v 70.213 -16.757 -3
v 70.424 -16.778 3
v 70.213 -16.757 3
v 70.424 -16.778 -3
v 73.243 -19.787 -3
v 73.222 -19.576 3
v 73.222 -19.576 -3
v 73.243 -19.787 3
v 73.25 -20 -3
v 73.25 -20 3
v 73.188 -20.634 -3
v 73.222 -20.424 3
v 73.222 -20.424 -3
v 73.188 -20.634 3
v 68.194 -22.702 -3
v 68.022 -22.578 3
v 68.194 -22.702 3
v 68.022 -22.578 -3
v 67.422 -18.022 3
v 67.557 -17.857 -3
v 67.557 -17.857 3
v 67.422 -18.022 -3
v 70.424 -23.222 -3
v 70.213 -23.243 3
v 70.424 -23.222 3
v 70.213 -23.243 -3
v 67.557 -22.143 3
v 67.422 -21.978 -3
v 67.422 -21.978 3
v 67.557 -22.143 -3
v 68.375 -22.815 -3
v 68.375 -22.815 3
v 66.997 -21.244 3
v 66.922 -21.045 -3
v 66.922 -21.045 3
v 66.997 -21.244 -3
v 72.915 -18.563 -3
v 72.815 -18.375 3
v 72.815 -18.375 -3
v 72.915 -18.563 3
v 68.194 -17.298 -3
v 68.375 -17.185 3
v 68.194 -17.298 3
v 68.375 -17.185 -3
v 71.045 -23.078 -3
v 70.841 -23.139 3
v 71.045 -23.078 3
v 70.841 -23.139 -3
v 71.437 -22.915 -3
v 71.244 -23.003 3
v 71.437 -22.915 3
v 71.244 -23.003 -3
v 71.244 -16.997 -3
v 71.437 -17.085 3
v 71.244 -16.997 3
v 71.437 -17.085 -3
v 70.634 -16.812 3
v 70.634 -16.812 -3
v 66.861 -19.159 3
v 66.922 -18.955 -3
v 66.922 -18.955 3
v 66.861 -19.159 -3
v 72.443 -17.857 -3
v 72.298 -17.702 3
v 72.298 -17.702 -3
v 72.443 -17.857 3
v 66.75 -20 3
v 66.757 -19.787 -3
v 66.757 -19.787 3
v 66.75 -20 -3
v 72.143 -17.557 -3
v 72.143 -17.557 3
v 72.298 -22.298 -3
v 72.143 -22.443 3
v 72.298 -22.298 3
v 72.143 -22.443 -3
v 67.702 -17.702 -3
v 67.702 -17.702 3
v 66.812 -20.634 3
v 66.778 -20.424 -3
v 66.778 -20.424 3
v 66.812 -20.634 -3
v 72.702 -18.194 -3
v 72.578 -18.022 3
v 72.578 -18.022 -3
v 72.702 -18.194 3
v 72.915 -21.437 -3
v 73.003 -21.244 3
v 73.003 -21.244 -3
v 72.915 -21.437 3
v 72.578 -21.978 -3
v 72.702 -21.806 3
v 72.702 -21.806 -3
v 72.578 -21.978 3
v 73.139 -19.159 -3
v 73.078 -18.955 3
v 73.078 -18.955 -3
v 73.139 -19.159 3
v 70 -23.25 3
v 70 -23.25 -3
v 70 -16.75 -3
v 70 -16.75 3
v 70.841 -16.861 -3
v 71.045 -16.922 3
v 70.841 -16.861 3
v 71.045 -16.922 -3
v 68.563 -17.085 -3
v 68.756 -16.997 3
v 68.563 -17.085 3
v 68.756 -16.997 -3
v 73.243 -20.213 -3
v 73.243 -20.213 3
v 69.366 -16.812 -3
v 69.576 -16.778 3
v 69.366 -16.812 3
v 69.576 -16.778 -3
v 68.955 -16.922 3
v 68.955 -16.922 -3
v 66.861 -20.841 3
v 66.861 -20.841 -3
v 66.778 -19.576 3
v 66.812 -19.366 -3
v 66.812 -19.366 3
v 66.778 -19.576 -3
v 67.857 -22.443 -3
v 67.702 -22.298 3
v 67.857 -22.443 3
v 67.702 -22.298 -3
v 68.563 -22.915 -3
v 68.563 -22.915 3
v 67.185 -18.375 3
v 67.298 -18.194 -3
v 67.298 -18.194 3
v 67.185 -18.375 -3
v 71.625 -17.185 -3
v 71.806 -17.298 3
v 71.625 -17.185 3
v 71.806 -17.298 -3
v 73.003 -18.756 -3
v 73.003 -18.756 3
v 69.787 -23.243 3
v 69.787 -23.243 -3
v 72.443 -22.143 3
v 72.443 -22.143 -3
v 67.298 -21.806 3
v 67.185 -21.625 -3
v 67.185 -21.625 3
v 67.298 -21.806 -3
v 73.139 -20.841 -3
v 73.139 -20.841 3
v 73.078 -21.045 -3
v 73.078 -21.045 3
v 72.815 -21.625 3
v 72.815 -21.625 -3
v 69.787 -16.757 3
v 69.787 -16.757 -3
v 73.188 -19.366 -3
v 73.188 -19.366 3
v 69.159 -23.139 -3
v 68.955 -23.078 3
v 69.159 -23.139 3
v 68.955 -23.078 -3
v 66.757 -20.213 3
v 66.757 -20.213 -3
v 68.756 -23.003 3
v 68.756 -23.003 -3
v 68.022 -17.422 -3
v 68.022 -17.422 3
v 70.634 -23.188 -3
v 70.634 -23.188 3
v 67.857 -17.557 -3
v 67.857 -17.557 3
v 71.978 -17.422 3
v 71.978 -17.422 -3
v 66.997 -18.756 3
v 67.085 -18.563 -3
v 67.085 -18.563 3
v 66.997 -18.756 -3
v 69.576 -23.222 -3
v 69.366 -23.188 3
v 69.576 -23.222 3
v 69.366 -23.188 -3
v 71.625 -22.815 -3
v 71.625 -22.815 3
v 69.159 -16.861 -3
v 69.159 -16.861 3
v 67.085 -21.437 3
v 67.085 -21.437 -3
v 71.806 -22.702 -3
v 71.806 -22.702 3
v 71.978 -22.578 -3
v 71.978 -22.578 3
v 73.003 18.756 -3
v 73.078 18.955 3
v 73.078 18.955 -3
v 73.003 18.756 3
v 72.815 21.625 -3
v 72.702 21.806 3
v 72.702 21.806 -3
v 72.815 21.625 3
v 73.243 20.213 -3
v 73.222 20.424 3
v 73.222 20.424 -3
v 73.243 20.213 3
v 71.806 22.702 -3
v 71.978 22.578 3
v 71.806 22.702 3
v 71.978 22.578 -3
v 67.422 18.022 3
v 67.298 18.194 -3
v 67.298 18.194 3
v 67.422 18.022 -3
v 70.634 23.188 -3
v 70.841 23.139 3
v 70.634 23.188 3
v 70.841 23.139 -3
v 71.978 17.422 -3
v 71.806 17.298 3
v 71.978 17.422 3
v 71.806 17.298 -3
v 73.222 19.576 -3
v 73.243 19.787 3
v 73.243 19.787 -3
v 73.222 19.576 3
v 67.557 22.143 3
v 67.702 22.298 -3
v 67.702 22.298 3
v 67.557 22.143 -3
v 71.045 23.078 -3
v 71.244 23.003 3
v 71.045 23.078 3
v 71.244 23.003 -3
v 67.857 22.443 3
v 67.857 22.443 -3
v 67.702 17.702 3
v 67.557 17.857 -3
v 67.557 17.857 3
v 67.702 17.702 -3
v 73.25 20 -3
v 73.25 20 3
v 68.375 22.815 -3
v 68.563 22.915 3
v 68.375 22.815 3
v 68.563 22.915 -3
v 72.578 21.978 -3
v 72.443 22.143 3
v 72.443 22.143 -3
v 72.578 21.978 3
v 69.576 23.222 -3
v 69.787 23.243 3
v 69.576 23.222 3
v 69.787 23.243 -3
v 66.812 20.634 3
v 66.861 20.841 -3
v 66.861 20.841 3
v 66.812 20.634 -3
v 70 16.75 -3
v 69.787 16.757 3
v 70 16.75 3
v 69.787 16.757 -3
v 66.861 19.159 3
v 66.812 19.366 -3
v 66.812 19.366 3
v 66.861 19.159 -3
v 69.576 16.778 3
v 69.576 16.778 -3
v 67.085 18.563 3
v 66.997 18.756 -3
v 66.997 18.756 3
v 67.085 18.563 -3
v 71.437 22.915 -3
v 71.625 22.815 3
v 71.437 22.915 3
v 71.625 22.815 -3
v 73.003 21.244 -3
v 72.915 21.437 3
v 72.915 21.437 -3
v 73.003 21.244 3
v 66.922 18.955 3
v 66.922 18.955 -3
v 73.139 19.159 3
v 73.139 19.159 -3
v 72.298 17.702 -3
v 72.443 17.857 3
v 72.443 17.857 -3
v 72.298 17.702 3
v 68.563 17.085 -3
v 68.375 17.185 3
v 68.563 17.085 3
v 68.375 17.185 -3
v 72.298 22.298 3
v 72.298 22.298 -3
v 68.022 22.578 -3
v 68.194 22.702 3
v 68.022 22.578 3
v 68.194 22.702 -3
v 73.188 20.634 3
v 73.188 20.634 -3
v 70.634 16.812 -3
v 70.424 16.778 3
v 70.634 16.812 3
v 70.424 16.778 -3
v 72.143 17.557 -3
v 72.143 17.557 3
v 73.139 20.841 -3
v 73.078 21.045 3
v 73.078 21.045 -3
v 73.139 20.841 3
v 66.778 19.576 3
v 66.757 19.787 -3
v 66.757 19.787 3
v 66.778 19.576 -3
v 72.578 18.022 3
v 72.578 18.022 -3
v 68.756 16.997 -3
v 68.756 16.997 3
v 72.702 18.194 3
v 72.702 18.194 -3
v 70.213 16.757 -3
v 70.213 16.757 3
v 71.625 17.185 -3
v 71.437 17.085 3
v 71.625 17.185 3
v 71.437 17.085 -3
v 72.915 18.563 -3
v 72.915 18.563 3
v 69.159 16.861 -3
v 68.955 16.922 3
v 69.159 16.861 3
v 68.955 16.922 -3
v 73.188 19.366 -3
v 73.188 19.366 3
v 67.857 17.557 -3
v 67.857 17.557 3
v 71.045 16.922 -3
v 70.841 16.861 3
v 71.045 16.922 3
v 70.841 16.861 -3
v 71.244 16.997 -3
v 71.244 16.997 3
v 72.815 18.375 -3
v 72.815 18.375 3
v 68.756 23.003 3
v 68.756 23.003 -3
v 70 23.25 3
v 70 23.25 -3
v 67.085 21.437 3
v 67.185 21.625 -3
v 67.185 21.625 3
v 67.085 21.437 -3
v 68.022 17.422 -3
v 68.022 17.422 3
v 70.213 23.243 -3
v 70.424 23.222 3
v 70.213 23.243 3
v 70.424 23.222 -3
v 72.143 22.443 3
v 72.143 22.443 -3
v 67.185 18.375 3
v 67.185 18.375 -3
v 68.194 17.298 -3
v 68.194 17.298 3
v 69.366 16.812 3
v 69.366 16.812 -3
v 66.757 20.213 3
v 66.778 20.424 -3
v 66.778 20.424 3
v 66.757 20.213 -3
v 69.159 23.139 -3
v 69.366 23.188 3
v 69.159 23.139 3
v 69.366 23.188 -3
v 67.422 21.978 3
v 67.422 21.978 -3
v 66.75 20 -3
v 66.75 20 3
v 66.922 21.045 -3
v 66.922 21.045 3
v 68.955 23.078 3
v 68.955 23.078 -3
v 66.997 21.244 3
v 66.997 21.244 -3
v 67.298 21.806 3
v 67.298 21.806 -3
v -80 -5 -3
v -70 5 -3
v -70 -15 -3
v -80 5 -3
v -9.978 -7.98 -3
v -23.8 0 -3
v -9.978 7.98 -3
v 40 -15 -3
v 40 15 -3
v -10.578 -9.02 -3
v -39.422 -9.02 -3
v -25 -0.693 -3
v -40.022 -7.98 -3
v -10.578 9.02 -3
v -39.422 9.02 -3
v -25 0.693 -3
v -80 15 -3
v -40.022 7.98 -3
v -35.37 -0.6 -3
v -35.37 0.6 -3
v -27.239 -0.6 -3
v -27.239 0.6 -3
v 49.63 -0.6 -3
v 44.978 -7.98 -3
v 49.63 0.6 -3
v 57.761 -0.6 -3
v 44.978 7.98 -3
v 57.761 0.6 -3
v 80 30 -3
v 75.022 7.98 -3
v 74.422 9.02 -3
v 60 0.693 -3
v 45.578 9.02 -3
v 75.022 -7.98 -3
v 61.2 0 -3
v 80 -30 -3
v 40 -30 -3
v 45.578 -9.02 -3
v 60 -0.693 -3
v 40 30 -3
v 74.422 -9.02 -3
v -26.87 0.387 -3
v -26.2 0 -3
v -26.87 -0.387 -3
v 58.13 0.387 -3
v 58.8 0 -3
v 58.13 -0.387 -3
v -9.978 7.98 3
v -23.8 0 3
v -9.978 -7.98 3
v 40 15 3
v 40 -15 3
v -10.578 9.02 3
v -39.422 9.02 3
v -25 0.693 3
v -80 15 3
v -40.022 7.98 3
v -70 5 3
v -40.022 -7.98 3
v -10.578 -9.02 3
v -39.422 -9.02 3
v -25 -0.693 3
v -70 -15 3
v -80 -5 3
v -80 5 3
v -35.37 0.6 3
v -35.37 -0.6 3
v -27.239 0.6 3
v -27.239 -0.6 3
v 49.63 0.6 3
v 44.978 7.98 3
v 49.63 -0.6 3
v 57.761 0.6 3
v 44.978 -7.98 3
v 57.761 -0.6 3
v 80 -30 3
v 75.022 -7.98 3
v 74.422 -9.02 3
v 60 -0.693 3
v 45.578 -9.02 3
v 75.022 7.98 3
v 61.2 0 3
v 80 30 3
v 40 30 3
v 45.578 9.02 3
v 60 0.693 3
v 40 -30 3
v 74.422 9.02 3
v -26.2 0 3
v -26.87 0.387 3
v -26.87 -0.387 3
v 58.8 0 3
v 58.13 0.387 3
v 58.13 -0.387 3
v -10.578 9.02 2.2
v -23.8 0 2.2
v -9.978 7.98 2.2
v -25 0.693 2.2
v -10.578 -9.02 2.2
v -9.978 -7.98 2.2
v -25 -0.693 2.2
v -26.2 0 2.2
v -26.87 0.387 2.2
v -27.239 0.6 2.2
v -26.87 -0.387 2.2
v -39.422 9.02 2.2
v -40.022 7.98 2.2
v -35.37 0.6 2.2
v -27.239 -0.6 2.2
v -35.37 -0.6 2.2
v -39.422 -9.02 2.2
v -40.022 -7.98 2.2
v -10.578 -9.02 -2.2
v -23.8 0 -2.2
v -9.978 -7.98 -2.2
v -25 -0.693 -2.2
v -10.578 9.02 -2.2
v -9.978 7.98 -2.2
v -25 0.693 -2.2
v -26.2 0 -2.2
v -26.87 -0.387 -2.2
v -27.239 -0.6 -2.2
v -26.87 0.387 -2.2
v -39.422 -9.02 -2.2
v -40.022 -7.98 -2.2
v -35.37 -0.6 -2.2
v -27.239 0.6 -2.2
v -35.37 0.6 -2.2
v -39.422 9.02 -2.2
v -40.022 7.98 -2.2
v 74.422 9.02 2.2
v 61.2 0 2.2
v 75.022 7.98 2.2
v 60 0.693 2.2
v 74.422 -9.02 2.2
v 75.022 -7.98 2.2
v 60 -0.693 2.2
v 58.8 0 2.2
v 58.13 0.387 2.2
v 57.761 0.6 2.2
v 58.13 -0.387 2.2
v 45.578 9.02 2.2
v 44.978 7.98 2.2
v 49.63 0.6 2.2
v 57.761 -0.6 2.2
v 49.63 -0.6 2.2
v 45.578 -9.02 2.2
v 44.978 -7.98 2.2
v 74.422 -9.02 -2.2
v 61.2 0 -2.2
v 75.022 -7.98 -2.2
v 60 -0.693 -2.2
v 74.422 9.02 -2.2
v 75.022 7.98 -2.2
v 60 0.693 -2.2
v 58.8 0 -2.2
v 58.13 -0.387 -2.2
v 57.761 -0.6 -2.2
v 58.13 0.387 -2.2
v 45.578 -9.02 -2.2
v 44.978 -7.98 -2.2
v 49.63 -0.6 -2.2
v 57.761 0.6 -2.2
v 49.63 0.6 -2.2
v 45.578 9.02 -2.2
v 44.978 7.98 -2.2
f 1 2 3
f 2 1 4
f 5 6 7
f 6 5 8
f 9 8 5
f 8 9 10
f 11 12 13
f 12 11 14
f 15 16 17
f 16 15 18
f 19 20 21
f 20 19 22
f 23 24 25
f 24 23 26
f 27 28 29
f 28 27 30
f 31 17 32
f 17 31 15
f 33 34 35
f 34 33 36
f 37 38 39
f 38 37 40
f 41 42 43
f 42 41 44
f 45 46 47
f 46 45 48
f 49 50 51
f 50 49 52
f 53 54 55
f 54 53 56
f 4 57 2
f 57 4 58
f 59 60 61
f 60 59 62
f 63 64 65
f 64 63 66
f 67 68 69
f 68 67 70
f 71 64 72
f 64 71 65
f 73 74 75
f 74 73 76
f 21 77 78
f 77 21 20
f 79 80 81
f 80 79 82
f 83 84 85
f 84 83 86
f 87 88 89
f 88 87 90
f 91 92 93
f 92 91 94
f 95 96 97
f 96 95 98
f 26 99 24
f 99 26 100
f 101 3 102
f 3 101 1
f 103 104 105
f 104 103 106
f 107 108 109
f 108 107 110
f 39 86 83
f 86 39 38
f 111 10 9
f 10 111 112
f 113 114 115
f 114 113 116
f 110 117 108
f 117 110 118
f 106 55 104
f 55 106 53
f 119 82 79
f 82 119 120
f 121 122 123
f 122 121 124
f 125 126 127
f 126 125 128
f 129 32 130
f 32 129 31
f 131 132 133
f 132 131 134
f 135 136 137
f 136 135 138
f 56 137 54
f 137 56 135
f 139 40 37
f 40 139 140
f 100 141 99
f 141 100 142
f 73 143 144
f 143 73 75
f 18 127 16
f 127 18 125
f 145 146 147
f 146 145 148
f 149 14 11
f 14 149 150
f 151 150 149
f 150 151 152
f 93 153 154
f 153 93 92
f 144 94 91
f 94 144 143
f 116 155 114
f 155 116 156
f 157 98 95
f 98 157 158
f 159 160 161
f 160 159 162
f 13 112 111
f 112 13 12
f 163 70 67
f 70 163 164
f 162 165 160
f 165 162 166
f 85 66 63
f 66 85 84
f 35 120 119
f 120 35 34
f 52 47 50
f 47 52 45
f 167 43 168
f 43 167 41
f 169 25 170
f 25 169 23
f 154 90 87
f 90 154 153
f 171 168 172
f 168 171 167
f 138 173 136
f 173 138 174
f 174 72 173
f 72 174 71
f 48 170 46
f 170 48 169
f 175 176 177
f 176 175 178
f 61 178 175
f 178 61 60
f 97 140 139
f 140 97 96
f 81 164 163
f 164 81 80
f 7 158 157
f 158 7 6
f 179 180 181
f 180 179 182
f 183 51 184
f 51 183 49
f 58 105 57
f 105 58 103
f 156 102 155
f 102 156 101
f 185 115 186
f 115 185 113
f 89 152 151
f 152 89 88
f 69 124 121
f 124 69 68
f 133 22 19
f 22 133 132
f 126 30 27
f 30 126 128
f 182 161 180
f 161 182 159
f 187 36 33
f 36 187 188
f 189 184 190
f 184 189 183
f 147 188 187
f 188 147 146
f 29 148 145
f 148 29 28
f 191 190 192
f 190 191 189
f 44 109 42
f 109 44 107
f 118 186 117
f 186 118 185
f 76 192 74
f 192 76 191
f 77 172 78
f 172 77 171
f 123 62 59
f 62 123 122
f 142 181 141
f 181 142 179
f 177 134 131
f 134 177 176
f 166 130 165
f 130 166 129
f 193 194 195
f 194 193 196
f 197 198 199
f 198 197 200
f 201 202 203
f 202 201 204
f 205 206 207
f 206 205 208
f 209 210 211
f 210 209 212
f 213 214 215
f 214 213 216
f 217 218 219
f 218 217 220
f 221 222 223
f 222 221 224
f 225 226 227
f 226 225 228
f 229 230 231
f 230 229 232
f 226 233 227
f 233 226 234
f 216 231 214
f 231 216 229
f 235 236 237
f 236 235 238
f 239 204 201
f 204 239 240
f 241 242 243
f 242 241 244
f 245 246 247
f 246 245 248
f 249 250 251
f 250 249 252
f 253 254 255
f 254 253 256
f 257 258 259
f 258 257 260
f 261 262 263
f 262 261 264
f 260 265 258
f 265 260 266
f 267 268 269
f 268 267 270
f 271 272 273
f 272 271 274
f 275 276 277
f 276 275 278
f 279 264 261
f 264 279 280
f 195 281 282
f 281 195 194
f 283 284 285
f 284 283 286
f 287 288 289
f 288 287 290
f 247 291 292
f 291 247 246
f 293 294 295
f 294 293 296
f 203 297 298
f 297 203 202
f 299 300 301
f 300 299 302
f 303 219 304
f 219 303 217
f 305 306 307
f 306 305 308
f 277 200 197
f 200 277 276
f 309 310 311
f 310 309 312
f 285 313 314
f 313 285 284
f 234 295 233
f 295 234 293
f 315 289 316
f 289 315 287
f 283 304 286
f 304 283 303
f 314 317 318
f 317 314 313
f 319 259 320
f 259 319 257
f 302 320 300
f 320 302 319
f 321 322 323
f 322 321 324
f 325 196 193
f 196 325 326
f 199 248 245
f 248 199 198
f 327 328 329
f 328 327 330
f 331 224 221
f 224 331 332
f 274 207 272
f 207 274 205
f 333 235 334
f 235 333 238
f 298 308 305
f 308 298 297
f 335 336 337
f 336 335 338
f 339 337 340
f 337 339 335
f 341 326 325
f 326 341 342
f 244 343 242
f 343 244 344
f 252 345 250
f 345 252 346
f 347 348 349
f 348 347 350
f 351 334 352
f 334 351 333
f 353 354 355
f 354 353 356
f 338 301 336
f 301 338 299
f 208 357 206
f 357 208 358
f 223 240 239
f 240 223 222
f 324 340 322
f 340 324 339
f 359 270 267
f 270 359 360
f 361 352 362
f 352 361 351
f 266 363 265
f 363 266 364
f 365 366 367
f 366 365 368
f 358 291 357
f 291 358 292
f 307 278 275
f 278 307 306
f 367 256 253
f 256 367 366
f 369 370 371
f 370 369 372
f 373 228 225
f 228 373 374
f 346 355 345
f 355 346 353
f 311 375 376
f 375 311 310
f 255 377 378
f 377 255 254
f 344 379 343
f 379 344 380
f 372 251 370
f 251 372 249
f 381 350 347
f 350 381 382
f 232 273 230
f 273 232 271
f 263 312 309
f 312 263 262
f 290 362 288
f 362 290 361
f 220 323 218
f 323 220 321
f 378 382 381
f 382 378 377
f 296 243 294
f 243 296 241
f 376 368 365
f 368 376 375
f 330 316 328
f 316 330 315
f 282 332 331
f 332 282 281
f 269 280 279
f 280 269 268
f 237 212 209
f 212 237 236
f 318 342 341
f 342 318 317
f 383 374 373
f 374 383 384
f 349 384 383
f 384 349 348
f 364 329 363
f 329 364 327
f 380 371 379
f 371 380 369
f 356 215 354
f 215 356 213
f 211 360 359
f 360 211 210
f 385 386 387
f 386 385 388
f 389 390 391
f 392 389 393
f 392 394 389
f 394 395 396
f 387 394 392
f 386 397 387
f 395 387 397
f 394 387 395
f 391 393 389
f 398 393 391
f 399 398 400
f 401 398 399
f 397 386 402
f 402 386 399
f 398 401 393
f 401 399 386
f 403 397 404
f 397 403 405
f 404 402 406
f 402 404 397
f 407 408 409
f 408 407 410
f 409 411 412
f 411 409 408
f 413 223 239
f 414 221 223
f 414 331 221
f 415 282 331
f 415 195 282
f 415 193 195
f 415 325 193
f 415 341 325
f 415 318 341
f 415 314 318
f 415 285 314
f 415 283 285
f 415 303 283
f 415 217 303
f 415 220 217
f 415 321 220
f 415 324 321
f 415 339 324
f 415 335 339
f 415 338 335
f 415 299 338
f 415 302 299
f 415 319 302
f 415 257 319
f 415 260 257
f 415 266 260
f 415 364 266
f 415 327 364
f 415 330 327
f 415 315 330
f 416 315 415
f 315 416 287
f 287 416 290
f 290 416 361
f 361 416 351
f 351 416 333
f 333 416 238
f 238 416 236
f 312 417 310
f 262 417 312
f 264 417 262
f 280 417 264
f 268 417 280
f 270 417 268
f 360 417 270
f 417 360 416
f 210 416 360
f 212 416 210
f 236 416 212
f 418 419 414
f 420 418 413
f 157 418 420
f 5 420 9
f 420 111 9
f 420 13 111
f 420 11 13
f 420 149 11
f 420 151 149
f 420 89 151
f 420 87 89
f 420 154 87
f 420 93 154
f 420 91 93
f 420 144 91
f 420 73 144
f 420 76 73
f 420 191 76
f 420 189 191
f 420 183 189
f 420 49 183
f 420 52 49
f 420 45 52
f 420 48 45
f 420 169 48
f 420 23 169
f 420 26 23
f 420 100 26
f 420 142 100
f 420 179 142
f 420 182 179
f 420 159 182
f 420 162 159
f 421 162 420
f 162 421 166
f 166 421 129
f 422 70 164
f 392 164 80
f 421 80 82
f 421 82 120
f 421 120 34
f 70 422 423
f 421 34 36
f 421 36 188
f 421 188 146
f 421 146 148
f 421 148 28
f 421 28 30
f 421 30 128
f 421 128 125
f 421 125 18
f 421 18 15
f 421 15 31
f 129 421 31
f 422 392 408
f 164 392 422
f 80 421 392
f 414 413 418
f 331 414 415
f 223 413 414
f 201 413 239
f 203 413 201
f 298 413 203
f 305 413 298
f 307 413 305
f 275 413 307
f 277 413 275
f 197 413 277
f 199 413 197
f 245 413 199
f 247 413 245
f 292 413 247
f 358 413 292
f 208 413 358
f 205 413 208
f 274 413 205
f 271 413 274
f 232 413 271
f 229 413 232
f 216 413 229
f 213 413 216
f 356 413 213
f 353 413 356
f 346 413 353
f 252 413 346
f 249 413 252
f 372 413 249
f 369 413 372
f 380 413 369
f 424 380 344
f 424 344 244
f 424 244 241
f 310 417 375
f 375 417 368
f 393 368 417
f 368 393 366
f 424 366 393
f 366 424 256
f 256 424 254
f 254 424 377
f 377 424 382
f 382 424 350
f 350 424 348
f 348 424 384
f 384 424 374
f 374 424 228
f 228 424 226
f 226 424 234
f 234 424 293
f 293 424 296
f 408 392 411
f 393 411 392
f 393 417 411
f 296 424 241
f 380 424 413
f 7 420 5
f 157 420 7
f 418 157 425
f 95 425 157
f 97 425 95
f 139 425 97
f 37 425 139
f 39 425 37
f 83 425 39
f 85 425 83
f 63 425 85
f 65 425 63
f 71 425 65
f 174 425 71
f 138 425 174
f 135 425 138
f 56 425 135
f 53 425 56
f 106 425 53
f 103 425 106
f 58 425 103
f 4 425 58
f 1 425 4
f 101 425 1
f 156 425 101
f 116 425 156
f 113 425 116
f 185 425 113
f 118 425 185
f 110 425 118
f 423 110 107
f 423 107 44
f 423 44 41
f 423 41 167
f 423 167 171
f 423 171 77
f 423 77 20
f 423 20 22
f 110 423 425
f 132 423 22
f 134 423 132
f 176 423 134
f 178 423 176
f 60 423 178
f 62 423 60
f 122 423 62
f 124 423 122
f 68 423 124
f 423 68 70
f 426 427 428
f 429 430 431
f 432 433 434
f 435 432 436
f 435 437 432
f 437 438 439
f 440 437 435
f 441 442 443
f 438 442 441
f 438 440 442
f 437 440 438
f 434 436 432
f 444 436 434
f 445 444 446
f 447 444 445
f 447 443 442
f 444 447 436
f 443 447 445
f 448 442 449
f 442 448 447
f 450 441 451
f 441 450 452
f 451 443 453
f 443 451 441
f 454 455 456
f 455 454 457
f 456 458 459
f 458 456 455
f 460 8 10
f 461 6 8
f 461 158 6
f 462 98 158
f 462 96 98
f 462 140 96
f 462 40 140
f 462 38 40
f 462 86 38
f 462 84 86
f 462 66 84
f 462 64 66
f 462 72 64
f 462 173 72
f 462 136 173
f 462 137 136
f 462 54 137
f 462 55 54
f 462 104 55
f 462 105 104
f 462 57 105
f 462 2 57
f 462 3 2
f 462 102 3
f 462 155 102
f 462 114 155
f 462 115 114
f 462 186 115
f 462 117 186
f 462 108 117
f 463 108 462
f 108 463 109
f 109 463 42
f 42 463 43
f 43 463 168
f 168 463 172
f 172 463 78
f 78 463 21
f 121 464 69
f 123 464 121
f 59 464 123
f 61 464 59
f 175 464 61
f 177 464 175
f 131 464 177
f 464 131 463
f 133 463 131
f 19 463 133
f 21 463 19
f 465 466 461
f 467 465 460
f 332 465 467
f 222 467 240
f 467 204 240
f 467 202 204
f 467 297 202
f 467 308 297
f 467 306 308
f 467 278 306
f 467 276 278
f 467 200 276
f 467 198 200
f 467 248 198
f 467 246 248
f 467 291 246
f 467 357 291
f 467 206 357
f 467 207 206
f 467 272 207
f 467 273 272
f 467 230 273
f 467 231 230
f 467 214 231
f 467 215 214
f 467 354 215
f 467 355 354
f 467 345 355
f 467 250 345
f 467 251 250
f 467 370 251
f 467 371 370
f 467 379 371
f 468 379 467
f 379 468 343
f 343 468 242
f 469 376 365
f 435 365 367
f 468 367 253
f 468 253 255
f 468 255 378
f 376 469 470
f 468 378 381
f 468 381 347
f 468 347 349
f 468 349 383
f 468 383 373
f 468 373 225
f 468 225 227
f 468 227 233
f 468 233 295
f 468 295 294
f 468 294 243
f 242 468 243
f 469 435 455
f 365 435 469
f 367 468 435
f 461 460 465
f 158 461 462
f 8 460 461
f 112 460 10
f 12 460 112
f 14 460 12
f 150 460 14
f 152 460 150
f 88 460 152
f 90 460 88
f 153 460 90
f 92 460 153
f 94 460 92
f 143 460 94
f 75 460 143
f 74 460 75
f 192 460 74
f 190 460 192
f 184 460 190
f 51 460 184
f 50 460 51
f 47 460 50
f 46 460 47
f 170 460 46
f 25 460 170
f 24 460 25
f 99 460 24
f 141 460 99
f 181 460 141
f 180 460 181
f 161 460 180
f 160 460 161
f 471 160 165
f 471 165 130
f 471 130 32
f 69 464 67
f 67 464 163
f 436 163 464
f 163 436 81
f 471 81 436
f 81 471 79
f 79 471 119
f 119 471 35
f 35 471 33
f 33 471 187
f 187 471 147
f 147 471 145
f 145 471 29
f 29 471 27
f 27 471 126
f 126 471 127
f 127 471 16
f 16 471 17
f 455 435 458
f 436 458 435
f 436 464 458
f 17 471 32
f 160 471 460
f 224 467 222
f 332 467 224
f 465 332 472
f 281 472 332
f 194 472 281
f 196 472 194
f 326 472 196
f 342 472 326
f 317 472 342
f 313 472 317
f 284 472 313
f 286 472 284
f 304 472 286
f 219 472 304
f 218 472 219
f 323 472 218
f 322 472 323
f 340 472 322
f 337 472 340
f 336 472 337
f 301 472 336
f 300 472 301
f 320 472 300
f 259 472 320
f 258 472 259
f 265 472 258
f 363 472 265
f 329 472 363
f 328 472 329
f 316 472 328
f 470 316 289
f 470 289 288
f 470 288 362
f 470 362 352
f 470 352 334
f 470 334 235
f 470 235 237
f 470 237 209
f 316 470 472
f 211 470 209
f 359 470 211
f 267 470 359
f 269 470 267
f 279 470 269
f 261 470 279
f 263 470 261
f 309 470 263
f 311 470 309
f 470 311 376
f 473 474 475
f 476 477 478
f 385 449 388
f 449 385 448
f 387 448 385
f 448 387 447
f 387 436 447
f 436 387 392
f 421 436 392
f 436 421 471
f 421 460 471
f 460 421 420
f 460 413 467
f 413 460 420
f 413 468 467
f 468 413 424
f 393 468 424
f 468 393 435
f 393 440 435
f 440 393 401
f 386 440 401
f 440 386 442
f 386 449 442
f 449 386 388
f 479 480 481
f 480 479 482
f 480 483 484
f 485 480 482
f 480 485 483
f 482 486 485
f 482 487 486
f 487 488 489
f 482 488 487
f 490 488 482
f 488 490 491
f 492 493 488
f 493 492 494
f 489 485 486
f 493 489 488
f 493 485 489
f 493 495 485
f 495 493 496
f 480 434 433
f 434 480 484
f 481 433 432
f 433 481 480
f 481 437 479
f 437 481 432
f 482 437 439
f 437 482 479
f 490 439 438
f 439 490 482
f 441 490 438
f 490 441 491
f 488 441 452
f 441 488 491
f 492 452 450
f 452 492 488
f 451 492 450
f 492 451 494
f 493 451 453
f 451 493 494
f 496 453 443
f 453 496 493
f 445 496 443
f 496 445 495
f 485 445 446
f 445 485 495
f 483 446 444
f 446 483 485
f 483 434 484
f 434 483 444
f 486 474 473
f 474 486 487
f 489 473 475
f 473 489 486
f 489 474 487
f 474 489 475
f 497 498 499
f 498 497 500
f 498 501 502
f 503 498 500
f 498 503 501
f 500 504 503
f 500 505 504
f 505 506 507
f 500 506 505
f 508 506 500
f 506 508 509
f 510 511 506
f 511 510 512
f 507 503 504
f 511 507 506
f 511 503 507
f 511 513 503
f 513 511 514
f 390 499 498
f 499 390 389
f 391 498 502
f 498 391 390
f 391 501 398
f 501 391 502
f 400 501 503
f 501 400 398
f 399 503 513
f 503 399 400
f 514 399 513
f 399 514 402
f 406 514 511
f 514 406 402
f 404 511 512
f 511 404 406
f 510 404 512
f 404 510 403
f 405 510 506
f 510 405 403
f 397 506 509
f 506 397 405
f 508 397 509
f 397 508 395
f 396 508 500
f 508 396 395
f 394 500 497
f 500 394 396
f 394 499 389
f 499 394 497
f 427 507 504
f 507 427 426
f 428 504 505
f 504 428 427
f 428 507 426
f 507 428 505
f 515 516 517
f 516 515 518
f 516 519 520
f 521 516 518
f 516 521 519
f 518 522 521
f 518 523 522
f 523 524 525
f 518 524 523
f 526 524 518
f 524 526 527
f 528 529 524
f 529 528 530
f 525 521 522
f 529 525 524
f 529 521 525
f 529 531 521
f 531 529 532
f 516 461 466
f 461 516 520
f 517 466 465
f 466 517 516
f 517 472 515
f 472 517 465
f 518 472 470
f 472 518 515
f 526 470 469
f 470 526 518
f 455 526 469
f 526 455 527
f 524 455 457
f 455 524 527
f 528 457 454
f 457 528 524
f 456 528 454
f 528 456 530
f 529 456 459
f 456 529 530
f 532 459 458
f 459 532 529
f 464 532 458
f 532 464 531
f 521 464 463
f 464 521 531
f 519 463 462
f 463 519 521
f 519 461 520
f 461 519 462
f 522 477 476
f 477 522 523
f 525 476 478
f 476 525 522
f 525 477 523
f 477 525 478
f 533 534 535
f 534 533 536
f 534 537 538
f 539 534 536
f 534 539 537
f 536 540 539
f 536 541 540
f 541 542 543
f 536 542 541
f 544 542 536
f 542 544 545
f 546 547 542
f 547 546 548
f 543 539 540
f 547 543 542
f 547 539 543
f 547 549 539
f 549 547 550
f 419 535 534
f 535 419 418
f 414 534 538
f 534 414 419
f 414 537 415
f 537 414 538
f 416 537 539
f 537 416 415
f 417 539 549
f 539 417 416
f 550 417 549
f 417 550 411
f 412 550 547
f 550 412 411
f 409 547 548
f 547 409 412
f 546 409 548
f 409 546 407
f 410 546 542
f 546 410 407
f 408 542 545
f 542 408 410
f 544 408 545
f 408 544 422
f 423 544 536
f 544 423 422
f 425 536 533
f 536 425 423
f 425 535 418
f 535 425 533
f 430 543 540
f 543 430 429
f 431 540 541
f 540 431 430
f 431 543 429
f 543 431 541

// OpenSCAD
$fn=96;

plate_th = 6;

body_len = 120;
body_w   = 30;

flange_len = 40;
flange_w   = 60;

total_len = body_len + flange_len;

chamfer = 10;

hole_d = 6.5;
hole_edge_x = 10;
hole_edge_y = 10;

emboss_depth = 0.8;
emboss_th = 1.2;

module stepped_outline_2d() {
    union() {
        translate([-total_len/2, -body_w/2]) square([body_len, body_w], center=false);
        translate([ total_len/2 - flange_len, -flange_w/2]) square([flange_len, flange_w], center=false);
    }
}

module chamfered_end_2d() {
    // subtract two right triangles at the far (non-flange) end corners
    union() {
        // top corner
        translate([-total_len/2, body_w/2 - chamfer])
            polygon(points=[[0,0],[chamfer,0],[0,chamfer]]);
        // bottom corner
        translate([-total_len/2, -body_w/2])
            polygon(points=[[0,0],[chamfer,0],[0,chamfer]]);
    }
}

module base_plate() {
    difference() {
        linear_extrude(height=plate_th, center=true)
            difference() {
                stepped_outline_2d();
                chamfered_end_2d();
            }

        // flange holes
        for (sy = [-1, 1]) {
            translate([ total_len/2 - hole_edge_x, sy*(flange_w/2 - hole_edge_y), 0])
                cylinder(h=plate_th+2, d=hole_d, center=true);
        }
    }
}

module v_feature_2d(len=34, w=18, t=emboss_th) {
    // V/arrow made from two rotated rectangles
    union() {
        translate([0,0]) rotate(30) square([len, t], center=true);
        translate([0,0]) rotate(-30) square([len, t], center=true);
        // small tail
        translate([-len*0.18,0]) square([len*0.25, t], center=true);
    }
}

module face_features(mode="recess") {
    // mode: "recess" subtracts; "emboss" adds
    zpos = plate_th/2 - emboss_depth/2;

    // positions along length: one on body, one on flange
    positions = [
        [-total_len/2 + 55, 0, 0],
        [ total_len/2 - 20, 0, 0]
    ];

    if (mode == "recess") {
        for (p = positions) {
            translate([p[0], p[1],  zpos])
                linear_extrude(height=emboss_depth, center=true)
                    v_feature_2d();
            translate([p[0], p[1], -zpos])
                linear_extrude(height=emboss_depth, center=true)
                    v_feature_2d();
        }
    } else {
        for (p = positions) {
            translate([p[0], p[1],  plate_th/2 + emboss_depth/2])
                linear_extrude(height=emboss_depth, center=true)
                    v_feature_2d();
            translate([p[0], p[1], -plate_th/2 - emboss_depth/2])
                linear_extrude(height=emboss_depth, center=true)
                    v_feature_2d();
        }
    }
}

difference() {
    base_plate();
    face_features("recess");
}
